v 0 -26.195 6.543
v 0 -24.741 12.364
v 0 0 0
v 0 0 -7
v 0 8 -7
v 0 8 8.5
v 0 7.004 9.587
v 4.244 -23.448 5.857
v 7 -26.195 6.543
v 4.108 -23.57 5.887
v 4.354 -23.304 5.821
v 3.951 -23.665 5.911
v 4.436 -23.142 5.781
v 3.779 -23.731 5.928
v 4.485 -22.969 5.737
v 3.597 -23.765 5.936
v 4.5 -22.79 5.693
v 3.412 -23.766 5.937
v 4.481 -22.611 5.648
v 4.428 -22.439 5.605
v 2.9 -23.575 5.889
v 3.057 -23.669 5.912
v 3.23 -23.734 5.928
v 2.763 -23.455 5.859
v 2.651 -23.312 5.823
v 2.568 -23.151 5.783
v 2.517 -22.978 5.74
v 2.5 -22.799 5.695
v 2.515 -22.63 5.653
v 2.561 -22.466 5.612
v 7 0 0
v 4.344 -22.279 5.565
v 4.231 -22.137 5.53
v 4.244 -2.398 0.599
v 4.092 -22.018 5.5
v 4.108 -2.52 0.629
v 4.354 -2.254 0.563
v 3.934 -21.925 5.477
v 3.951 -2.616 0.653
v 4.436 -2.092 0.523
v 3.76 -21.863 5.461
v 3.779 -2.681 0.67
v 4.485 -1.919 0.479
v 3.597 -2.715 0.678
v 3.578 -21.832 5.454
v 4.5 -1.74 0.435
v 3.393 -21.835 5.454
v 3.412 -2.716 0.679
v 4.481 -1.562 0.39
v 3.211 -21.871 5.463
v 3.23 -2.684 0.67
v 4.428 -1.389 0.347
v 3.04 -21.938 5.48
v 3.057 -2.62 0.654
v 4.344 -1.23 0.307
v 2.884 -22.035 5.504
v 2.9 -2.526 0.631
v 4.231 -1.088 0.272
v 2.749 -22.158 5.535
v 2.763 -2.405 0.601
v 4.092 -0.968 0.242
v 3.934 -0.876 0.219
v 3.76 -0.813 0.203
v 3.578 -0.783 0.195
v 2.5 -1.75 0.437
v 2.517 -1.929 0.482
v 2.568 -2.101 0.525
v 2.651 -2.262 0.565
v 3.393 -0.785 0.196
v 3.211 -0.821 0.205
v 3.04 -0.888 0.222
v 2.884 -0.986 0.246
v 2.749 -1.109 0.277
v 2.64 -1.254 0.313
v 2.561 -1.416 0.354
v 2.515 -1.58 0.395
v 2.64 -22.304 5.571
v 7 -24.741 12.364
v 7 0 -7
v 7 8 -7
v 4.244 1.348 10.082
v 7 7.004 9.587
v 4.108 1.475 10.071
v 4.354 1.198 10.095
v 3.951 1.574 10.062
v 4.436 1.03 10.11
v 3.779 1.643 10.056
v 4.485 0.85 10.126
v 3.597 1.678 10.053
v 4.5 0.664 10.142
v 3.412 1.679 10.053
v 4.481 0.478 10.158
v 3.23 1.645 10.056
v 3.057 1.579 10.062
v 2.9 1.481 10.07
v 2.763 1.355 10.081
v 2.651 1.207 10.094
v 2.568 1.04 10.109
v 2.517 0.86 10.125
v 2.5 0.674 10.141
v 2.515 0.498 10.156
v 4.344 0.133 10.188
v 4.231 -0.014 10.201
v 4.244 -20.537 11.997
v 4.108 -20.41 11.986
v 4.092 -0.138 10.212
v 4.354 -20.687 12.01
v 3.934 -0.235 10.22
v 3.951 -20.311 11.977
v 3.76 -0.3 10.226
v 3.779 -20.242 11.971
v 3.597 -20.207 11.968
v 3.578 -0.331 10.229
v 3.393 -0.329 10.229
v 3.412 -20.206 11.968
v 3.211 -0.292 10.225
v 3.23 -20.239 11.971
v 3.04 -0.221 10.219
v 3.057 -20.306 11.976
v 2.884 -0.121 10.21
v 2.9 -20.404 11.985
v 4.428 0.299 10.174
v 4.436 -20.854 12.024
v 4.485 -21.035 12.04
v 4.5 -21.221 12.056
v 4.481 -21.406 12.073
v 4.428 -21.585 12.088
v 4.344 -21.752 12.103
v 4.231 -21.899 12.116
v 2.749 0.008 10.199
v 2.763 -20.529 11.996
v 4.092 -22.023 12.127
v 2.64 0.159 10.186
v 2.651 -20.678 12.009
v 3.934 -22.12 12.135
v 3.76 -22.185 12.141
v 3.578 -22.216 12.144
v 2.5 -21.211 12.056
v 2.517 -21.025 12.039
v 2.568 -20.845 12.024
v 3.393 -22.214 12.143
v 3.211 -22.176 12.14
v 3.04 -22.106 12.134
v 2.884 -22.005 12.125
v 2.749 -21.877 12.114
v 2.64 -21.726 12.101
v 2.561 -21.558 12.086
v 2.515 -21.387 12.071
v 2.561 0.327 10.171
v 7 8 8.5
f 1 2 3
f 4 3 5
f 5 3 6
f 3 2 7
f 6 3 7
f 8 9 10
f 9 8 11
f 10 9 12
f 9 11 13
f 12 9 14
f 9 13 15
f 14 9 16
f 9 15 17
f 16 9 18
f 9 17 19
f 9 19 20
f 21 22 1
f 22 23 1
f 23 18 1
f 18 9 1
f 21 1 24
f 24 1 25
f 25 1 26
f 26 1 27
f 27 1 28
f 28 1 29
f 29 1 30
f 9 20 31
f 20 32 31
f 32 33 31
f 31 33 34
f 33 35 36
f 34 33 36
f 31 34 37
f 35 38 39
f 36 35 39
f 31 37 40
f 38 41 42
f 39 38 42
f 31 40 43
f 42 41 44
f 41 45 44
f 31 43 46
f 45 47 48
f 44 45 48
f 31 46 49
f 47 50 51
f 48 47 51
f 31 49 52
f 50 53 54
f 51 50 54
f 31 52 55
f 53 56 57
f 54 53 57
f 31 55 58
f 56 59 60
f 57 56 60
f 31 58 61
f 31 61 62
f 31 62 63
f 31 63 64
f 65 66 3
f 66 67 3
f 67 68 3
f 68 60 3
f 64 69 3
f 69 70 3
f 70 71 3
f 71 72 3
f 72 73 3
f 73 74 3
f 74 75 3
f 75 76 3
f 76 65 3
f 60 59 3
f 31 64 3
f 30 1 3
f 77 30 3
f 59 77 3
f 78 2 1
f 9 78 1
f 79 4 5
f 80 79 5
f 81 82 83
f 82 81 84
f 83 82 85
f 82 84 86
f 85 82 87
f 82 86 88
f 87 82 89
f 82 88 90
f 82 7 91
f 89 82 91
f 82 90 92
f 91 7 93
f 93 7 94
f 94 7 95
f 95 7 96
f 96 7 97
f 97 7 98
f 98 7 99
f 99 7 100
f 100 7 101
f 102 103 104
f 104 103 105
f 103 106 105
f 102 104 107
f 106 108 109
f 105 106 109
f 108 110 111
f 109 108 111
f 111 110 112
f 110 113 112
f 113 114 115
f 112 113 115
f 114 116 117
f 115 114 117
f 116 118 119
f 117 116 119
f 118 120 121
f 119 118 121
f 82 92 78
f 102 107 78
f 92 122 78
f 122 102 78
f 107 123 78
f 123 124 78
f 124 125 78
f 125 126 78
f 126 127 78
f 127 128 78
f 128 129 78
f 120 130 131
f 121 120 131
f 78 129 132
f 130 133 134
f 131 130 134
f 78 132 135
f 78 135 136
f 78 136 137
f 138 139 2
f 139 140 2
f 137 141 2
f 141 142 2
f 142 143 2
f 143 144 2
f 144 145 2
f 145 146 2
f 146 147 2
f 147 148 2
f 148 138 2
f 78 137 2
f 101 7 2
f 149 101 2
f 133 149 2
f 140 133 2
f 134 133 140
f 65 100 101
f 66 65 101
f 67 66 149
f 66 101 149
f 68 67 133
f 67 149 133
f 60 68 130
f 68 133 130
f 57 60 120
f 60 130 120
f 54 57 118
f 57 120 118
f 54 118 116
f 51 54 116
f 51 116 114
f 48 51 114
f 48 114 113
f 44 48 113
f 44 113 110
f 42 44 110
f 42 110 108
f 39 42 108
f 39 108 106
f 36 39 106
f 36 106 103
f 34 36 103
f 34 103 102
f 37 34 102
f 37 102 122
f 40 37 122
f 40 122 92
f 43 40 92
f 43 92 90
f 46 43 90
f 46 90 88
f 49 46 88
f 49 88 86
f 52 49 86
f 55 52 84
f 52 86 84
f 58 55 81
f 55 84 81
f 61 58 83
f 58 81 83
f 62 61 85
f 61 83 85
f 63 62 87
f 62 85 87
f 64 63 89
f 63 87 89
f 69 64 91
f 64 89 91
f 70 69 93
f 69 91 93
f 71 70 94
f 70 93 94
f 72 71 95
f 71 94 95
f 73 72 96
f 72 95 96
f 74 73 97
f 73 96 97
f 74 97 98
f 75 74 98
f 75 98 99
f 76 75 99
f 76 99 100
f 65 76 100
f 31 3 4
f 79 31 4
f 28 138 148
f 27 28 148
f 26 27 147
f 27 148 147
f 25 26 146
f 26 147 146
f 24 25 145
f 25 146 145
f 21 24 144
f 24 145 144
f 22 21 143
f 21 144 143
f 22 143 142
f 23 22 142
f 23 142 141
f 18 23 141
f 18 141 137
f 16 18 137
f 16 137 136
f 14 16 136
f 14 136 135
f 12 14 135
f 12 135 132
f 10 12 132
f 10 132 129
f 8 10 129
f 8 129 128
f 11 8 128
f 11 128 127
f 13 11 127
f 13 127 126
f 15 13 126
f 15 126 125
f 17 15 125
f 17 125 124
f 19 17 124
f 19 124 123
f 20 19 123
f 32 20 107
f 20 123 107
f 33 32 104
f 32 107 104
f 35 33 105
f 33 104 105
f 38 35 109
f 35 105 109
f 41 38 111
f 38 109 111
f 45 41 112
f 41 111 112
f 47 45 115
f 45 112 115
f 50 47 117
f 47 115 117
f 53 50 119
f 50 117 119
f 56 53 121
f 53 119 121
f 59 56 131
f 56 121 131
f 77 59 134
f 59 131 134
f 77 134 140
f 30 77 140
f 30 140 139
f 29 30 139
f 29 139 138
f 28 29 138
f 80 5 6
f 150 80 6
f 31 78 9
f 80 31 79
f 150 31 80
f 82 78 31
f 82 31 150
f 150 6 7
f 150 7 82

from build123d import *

# Parameters (mm, degrees)
F1_DEPTH = 7
F3_D     = 2
F4_SIZE  = 1


with BuildPart() as f1:
    # F0 (on Right) → F1 (new body)
    with BuildSketch(Plane.YZ):
        Polygon((-26.19513, 6.543331), (0, 0), (0, -7), (8, -7), (8, 9.5), (-24.741056, 12.364471), align=None)
    extrude(amount=F1_DEPTH)

    # F3 (through all)
    with Locations(Plane(origin=(0, 0, 0), x_dir=(1, 0, 0), z_dir=(0, -0.242346, -0.97019))):
        with Locations((3.5, 1.803581), (3.5, 23.5)):
            Hole(F3_D / 2)

    # F4
    f4_edges = [f1.edges().sort_by_distance(p)[0] for p in [
        (3.5, 8, 9.5),
    ]]
    chamfer(f4_edges, length=F4_SIZE)


solid = f1.part
